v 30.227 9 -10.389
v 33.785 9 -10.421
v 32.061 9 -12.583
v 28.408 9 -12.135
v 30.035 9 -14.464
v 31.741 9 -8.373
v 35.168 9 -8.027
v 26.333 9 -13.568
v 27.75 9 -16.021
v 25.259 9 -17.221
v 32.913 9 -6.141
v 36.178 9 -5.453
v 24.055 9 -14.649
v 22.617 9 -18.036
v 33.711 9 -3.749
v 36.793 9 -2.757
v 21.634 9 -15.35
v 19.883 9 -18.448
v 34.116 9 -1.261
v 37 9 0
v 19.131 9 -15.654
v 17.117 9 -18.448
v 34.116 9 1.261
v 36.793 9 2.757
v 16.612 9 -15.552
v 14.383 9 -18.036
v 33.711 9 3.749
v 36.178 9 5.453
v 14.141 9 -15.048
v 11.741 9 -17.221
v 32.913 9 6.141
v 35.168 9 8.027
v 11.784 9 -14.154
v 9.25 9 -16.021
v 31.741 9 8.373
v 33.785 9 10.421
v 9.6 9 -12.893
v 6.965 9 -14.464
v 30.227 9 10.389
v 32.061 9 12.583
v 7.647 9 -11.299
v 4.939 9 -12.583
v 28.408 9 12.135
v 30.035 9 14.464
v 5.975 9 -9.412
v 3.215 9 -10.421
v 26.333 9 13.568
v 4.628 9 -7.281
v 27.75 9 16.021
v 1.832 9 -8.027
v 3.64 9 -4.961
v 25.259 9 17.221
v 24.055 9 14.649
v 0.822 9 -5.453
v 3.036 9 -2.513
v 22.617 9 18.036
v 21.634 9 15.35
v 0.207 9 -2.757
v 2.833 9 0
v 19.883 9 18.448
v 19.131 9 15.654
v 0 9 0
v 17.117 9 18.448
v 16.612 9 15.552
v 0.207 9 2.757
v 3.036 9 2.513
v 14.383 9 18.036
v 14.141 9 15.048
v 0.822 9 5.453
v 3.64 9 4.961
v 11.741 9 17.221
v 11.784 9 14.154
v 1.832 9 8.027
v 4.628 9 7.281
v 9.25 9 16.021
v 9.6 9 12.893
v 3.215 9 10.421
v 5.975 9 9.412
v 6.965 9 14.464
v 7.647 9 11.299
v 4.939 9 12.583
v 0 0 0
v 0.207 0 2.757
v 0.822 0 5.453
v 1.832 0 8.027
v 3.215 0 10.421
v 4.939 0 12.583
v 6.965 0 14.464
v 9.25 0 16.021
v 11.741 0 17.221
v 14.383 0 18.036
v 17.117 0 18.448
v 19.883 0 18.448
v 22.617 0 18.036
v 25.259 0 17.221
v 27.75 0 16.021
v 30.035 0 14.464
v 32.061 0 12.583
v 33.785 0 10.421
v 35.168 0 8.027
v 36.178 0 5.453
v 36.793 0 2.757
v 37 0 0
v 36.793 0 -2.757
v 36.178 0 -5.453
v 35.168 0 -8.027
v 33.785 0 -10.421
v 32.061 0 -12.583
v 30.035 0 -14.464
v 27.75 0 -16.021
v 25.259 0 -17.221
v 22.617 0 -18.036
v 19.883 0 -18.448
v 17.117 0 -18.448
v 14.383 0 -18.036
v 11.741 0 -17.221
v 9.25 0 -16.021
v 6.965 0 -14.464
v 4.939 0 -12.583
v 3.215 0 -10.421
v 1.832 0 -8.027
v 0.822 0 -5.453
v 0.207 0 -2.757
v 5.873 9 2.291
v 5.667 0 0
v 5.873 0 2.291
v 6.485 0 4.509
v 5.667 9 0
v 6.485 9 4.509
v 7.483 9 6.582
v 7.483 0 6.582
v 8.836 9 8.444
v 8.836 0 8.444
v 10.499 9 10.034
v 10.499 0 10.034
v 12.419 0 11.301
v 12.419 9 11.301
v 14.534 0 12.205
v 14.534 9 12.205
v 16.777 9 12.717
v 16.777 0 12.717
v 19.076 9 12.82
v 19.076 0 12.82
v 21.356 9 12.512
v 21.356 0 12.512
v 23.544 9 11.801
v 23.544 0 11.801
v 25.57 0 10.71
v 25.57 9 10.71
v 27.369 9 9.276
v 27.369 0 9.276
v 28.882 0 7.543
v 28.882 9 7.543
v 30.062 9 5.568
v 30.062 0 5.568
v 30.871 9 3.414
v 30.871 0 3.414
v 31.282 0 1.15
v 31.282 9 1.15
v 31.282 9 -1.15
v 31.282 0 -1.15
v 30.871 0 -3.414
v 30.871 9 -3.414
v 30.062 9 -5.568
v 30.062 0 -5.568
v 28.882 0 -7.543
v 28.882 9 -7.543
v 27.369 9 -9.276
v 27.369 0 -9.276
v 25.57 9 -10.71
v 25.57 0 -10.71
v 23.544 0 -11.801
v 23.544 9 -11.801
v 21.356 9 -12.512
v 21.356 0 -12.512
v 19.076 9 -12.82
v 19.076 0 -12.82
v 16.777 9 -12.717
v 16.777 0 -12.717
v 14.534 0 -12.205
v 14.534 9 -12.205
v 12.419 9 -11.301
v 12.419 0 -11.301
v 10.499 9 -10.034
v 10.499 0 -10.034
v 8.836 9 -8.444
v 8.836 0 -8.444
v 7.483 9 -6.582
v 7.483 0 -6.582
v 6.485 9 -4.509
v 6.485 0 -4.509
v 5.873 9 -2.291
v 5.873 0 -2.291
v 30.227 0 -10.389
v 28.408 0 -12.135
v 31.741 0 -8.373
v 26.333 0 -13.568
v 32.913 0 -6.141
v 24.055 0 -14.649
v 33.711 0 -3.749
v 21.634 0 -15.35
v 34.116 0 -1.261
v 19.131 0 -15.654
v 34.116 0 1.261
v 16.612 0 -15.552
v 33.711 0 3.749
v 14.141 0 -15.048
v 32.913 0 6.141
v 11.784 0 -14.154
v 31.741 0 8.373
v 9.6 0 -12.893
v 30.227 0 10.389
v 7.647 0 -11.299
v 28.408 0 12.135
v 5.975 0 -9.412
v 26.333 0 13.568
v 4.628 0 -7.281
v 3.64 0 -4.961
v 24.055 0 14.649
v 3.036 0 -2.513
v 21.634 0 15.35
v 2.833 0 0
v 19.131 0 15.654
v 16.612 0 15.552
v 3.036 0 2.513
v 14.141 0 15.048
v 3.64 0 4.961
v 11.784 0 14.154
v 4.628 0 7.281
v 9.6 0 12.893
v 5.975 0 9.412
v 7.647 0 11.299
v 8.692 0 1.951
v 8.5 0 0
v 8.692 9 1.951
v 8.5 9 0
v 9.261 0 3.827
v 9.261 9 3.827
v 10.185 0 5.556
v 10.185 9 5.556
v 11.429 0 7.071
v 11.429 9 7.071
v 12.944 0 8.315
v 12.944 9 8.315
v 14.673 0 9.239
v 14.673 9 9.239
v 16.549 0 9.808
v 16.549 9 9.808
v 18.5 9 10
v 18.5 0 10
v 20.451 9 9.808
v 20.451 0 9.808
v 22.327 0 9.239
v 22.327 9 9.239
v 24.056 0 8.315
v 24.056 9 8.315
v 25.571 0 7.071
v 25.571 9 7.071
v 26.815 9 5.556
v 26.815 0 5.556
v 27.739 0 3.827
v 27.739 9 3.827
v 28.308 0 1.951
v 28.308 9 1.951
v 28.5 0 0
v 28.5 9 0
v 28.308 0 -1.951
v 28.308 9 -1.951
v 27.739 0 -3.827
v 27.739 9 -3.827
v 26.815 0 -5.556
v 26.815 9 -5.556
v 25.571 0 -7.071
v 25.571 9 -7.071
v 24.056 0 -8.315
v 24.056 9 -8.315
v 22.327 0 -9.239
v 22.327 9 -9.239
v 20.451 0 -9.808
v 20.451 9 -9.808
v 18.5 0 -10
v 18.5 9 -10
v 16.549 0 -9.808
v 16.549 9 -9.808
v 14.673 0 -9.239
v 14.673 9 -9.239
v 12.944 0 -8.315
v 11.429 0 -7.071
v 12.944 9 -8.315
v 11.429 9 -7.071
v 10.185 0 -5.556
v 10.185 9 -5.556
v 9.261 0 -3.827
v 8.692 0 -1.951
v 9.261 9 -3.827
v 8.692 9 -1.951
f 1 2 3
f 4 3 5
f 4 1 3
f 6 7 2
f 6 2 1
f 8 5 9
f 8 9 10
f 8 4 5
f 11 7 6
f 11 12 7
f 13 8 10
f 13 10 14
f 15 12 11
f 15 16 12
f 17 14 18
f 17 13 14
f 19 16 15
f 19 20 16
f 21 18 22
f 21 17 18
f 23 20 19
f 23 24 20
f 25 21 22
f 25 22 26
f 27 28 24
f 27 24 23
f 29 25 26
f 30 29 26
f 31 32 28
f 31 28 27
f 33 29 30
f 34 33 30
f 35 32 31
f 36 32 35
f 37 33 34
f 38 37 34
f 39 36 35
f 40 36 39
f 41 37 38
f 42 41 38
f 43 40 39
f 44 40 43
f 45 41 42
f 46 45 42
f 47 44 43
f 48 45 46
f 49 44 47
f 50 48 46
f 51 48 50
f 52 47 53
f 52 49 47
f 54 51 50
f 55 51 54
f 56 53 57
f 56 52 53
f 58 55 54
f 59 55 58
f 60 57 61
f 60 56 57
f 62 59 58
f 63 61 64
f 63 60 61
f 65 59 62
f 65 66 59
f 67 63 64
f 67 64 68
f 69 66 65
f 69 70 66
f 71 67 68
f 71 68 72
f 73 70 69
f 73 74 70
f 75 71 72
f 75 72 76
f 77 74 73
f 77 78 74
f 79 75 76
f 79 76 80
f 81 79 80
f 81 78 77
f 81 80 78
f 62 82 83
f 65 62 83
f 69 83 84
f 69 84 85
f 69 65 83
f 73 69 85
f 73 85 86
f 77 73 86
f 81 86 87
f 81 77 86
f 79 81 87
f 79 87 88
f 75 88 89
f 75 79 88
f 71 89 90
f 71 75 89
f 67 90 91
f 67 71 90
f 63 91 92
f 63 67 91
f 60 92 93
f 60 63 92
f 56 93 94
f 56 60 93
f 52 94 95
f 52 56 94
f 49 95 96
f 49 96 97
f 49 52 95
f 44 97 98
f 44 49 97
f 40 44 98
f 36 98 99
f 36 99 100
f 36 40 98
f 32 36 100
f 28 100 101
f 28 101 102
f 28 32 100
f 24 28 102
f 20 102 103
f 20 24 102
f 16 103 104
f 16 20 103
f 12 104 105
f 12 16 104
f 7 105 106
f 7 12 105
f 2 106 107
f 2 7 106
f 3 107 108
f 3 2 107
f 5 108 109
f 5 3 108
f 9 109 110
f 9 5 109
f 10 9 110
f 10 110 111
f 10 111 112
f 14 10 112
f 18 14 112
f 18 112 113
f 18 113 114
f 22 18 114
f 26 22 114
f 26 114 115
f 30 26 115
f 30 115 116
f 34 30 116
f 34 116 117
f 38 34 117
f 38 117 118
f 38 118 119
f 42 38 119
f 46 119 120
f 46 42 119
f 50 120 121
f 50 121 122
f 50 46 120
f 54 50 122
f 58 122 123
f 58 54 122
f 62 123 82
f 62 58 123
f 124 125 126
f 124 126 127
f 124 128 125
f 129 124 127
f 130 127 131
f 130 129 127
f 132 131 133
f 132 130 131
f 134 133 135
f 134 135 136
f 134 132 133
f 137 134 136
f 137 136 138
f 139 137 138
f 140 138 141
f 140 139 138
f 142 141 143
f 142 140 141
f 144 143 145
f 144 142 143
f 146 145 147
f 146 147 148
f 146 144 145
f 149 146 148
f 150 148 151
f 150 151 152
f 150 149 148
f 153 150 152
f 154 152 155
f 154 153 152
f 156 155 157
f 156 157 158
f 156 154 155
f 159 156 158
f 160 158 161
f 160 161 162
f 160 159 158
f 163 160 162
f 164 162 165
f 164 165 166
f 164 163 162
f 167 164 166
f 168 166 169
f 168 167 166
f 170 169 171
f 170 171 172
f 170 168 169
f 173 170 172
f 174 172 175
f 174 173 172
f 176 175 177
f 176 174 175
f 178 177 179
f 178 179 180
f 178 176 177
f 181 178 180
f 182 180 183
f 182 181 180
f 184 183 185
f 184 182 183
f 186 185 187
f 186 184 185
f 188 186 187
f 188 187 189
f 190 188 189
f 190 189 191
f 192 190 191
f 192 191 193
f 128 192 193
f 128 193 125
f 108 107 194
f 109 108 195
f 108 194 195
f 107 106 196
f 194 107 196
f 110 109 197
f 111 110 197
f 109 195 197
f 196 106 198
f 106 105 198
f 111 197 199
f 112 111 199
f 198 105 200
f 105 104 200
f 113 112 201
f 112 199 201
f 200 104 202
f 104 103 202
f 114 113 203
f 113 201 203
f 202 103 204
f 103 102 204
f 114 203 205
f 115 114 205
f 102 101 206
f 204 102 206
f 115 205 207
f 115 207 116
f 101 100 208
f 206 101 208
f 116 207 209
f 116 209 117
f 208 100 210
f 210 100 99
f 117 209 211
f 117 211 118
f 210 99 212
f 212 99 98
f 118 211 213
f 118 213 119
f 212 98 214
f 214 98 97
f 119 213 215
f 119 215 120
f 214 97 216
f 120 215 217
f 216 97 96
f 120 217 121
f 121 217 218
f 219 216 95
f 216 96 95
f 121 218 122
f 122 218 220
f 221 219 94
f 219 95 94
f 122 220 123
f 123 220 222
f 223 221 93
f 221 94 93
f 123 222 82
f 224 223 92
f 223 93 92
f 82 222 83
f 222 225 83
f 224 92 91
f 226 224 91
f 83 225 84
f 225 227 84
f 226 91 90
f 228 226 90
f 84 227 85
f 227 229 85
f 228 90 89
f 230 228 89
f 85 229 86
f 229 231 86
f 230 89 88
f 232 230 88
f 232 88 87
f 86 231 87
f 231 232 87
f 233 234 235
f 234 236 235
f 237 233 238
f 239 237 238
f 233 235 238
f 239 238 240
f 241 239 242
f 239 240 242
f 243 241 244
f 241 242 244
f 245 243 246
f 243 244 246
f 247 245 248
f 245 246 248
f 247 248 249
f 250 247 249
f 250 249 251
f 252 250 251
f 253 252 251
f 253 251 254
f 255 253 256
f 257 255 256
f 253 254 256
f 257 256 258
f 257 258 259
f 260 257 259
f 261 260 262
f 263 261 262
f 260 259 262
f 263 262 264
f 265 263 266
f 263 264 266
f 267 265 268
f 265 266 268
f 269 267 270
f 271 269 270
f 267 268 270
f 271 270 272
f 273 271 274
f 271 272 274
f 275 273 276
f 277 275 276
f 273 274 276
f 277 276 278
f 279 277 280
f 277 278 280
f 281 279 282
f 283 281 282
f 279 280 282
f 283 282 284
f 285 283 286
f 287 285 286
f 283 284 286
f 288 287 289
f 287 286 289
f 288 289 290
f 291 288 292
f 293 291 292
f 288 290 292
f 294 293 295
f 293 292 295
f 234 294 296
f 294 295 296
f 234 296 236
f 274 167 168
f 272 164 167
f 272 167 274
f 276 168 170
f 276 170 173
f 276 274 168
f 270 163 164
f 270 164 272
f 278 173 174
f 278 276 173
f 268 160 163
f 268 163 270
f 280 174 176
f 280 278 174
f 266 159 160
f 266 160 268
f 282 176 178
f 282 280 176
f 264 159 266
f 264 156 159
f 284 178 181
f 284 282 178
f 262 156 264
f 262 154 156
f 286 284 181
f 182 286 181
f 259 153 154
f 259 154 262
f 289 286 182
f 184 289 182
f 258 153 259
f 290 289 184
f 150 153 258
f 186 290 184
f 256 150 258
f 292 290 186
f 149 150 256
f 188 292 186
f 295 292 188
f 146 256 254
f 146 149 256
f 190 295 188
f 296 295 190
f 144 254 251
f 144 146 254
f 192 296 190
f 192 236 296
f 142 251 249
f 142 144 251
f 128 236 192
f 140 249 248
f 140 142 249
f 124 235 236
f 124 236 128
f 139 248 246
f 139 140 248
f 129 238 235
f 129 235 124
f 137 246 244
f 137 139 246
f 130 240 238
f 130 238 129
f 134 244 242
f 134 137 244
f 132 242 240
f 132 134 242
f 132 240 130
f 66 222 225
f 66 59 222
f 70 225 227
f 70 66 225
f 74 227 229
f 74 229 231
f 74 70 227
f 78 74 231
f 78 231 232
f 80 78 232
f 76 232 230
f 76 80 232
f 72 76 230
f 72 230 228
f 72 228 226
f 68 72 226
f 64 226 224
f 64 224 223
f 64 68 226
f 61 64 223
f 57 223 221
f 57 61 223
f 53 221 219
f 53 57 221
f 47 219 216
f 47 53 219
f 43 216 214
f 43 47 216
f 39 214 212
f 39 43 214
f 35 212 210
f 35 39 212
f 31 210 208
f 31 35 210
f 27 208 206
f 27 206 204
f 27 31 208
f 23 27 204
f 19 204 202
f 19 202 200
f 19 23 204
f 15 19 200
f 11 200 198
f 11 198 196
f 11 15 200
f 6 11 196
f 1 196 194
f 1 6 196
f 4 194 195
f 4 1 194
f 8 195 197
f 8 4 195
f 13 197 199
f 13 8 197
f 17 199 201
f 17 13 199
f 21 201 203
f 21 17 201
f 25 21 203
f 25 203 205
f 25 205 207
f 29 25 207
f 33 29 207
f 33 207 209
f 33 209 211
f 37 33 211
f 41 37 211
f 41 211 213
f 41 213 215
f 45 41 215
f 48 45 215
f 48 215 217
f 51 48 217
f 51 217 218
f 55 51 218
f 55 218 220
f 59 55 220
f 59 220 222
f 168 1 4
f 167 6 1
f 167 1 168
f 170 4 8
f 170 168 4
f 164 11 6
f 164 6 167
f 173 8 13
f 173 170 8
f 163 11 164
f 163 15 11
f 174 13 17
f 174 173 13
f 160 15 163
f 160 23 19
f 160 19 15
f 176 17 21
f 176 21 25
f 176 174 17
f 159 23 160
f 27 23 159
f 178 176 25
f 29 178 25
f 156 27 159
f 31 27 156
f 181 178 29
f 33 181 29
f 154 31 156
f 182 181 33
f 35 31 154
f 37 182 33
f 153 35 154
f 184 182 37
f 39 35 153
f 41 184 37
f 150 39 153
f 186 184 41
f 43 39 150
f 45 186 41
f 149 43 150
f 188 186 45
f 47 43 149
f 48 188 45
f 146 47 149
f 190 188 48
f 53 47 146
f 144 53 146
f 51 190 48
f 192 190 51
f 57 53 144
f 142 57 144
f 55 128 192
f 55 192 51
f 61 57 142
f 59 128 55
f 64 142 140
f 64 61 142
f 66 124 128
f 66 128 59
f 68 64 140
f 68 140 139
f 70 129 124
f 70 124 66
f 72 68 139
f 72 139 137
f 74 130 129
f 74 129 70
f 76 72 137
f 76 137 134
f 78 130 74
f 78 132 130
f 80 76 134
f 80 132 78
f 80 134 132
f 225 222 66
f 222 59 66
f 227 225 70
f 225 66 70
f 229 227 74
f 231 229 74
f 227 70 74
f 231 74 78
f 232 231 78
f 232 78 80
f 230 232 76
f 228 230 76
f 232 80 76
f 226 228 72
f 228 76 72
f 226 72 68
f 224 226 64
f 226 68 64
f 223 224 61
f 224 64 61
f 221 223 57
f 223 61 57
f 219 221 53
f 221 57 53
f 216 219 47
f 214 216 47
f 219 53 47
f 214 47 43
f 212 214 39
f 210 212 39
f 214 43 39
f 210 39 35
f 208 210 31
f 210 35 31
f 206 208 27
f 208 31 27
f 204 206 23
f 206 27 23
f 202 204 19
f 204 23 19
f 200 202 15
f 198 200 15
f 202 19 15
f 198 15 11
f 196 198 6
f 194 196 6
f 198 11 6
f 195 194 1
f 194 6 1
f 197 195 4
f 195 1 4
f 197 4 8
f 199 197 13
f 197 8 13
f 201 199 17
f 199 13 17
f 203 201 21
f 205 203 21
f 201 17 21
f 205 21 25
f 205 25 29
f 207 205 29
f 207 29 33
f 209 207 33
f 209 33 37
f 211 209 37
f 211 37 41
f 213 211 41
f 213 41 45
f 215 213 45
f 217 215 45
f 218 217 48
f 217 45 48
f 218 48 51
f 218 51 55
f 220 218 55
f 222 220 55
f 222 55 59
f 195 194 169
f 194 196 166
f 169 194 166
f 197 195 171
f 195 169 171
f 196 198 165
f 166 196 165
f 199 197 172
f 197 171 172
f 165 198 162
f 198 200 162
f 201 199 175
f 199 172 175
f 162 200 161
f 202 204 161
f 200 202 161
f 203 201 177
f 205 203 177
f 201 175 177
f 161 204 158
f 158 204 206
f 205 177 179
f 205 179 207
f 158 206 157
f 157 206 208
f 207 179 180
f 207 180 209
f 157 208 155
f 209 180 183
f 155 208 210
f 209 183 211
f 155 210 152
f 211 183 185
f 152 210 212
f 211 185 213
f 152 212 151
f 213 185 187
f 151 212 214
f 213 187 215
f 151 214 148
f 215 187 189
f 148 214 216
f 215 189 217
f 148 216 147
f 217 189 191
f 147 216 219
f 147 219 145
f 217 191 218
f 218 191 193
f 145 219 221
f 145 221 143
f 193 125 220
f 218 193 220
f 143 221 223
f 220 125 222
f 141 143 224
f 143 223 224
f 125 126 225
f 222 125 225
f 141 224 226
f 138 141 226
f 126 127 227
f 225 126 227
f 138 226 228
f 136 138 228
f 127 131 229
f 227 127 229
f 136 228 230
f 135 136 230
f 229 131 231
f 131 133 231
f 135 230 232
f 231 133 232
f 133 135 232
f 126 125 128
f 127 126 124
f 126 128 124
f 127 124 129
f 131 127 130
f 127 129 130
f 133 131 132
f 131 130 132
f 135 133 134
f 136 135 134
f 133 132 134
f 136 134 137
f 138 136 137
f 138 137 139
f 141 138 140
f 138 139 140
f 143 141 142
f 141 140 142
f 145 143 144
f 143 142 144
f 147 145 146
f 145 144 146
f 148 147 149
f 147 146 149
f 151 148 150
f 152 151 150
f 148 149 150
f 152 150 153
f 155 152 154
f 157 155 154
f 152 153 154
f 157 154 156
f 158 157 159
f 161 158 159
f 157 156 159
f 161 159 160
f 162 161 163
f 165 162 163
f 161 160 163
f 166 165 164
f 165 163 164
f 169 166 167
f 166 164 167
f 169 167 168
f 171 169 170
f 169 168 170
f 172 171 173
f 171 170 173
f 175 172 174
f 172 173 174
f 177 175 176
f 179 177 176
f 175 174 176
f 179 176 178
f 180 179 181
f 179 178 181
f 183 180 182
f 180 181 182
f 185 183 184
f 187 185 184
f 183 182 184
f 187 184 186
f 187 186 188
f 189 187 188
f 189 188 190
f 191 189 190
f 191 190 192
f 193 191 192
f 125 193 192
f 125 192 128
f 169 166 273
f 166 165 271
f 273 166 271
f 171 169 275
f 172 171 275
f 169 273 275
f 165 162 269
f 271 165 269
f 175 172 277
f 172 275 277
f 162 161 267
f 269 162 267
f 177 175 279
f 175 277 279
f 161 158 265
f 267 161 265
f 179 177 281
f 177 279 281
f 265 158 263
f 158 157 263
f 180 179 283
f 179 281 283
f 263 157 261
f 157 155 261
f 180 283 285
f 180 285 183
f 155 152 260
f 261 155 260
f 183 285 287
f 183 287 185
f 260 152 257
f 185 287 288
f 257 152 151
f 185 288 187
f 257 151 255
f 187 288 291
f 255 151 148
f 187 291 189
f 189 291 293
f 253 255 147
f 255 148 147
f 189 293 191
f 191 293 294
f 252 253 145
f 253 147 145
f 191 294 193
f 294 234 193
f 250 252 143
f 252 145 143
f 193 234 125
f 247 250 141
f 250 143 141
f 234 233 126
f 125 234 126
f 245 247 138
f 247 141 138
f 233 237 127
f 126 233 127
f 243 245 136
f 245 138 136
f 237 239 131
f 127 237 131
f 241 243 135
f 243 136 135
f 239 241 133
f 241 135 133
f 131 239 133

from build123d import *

# Parameters (mm, degrees)
F0_W   = 2.833333
F0_H   = 9
F0_W_2 = 2.833334


with BuildPart() as f1:
    # F0 (on Top) → F1 (revolve)
    with BuildSketch(Plane.XY):
        with Locations((1.416666, 4.5)):
            Rectangle(F0_W, F0_H)
    revolve(axis=Axis((18.5, 4.5, 0), (0, 1, 0)))


with BuildPart() as f2:
    # F0 (on Top) → F2 (revolve)
    with BuildSketch(Plane.XY):
        with Locations((4.25, 4.5)):
            Rectangle(F0_W_2, F0_H)
    revolve(axis=Axis((18.5, 4.5, 0), (0, 1, 0)))


with BuildPart() as f3:
    # F0 (on Top) → F3 (revolve)
    with BuildSketch(Plane.XY):
        with Locations((7.083334, 4.5)):
            Rectangle(F0_W, F0_H)
    revolve(axis=Axis((18.5, 4.5, 0), (0, 1, 0)))


solid = Compound([f1.part, f2.part, f3.part])
